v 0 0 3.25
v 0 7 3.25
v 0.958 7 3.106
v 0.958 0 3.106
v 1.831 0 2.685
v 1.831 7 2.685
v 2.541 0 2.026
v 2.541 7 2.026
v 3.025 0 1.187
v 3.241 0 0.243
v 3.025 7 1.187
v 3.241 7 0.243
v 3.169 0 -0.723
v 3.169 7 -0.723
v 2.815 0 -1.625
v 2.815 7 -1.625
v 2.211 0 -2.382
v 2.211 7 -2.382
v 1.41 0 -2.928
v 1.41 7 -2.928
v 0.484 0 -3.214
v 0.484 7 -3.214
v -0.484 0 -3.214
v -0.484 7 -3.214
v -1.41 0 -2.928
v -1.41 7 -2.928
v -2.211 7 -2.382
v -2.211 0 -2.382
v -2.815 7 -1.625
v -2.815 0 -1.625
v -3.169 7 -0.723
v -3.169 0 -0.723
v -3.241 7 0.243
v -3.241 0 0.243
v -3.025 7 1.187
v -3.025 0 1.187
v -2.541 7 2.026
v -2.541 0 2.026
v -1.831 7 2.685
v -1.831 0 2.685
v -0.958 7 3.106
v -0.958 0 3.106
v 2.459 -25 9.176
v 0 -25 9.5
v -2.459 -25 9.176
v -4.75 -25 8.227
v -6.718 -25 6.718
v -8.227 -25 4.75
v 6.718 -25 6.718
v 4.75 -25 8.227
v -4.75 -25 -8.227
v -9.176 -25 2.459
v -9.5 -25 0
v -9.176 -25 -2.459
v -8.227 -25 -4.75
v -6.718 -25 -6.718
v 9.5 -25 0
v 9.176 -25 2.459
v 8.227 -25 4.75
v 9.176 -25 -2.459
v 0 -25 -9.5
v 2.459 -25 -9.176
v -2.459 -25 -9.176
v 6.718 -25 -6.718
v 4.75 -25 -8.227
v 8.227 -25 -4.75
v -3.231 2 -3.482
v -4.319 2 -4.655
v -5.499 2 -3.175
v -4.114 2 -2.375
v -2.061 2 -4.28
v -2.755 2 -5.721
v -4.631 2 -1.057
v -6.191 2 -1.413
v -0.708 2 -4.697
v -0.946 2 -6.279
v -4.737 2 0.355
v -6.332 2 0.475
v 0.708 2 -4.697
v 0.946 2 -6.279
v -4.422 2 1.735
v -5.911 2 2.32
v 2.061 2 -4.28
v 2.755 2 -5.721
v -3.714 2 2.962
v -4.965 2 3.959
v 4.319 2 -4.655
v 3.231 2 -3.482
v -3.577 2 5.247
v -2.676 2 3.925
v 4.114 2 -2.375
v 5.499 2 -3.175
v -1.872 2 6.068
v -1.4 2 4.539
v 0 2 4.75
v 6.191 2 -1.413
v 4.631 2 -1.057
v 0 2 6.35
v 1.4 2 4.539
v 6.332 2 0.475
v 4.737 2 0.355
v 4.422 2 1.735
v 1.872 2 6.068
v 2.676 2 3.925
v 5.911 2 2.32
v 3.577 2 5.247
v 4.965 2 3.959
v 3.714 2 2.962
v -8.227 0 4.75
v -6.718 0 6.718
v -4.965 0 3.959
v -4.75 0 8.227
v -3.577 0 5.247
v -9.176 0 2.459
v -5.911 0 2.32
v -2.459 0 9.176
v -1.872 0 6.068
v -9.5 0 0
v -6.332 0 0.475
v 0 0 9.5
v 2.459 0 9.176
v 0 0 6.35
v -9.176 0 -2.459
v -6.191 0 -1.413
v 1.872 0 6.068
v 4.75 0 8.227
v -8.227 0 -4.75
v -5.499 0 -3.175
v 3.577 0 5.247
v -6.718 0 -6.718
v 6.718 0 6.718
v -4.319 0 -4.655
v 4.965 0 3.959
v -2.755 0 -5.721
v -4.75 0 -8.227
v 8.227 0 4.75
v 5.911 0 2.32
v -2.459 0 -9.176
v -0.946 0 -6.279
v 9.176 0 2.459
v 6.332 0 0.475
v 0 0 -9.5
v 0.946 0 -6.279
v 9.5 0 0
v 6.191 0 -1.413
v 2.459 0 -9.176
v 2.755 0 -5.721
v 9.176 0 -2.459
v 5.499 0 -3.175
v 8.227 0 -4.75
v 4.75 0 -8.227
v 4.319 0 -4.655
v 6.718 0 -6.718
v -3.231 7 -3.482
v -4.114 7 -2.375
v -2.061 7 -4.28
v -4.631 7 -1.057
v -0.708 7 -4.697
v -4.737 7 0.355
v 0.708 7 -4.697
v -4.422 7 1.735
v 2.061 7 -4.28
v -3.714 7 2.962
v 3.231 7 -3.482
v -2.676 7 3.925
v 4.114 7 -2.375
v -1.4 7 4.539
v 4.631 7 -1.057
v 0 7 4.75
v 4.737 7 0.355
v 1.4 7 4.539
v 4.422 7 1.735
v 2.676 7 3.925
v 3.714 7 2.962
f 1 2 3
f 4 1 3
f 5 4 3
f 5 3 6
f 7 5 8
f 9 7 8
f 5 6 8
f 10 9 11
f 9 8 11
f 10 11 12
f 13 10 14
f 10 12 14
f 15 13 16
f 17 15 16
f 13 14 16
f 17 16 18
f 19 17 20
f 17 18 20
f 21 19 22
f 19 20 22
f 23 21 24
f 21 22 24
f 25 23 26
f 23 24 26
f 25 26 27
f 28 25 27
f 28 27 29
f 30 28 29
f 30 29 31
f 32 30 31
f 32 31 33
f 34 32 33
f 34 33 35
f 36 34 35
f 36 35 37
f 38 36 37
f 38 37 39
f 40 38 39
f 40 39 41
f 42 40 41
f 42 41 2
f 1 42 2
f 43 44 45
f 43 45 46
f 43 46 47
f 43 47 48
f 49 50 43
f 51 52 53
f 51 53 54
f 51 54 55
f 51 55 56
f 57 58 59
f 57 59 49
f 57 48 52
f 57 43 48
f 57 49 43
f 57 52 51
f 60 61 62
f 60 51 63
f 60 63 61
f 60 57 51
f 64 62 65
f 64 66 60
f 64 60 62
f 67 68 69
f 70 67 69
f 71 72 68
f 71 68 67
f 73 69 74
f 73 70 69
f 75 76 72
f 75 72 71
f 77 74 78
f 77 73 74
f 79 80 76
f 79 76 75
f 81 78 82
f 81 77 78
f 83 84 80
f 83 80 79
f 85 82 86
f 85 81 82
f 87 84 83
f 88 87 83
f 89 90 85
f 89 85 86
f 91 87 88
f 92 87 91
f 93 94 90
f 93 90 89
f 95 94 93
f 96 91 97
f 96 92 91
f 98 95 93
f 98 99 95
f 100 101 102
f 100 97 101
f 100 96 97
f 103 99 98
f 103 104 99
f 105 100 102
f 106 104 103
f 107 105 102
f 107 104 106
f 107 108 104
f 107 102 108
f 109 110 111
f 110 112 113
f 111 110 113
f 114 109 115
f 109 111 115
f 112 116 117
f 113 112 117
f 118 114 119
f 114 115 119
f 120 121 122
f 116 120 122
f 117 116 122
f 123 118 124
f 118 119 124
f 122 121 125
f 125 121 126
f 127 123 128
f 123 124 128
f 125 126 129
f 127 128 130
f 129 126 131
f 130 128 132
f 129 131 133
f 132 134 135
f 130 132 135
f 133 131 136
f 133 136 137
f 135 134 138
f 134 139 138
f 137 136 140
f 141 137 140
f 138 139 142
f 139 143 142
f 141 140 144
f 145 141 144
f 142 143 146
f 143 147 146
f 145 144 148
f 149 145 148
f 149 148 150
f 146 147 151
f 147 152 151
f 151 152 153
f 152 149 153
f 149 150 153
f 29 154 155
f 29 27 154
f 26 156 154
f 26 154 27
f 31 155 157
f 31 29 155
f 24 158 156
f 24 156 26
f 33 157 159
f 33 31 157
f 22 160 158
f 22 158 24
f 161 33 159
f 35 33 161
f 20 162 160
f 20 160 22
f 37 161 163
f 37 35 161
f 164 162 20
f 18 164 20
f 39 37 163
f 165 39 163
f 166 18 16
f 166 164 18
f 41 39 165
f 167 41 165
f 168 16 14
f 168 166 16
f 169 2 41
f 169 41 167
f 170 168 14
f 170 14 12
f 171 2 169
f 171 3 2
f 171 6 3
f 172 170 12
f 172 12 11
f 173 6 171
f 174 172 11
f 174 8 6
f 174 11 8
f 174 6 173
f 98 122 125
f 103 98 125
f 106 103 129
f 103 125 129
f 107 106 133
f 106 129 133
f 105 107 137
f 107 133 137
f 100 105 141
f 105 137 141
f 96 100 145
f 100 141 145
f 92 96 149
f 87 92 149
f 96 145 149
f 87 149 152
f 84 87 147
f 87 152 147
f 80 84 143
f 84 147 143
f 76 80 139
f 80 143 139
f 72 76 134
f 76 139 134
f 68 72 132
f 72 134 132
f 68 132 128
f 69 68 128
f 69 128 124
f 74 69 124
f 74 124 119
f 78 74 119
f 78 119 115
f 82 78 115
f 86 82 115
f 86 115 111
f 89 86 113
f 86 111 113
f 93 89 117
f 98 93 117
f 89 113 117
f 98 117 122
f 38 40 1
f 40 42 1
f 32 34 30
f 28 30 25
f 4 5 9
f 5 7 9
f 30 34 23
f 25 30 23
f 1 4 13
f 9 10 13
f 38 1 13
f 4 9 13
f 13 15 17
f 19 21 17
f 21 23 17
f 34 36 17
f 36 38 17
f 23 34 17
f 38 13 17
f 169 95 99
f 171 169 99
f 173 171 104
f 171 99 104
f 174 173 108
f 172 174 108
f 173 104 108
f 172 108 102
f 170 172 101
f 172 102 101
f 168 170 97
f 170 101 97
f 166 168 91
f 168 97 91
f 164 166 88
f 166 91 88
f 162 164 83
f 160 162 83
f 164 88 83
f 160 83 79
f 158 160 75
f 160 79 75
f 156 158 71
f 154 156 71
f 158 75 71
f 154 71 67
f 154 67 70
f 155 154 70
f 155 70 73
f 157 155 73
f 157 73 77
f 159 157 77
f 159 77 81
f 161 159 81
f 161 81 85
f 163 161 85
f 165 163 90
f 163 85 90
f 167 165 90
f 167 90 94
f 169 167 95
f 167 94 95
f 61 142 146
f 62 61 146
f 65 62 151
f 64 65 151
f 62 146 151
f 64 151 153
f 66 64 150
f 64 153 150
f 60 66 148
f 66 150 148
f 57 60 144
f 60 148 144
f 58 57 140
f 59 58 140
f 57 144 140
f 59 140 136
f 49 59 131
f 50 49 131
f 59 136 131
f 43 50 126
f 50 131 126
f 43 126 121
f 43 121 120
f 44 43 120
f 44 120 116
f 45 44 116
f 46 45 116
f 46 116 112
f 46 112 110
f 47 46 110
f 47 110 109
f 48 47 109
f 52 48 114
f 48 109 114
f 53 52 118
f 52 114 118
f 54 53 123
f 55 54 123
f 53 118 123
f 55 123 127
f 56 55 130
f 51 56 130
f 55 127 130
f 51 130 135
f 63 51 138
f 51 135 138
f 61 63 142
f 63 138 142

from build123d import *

# Parameters (mm, degrees)
SKETCH_1_R          = 6.35
EXTRUDE_1_DEPTH     = 2
SKETCH_2_R          = 4.75
EXTRUDE_2_DEPTH     = 5
SKETCH_3_R          = 3.25
CUT_EXTRUDE_1_DEPTH = 12.386175829
SKETCH_4_R          = 9.5
EXTRUDE_3_DEPTH     = 25


with BuildPart() as part:
    # 草图1 → 凸台-拉伸1 (new body)
    with BuildSketch(Plane(origin=(0, 0, 0), x_dir=(1, 0, 0), z_dir=(0, 1, 0))):
        with Locations(Location((0, 0, 0), (0, 0, 270))):
            Circle(SKETCH_1_R)
    extrude(amount=EXTRUDE_1_DEPTH)

    # 草图2 → 凸台-拉伸2 (add)
    with BuildSketch(Plane(origin=(0, 2, 0), x_dir=(1, 0, 0), z_dir=(0, 1, 0))):
        with Locations(Location((0, 0, 0), (0, 0, 270))):
            Circle(SKETCH_2_R)
    extrude(amount=EXTRUDE_2_DEPTH)

    # 草图3 → 切除-拉伸1 (cut, through all)
    with BuildSketch(Plane(origin=(0, 7, 0), x_dir=(1, 0, 0), z_dir=(0, 1, 0))):
        with Locations(Location((0, 0, 0), (0, 0, 270))):
            Circle(SKETCH_3_R)
    extrude(amount=-CUT_EXTRUDE_1_DEPTH, mode=Mode.SUBTRACT)

    # 草图4 → 凸台-拉伸3 (add)
    with BuildSketch(Plane.XZ):
        with Locations(Location((0, 0, 0), (0, 0, 270))):
            Circle(SKETCH_4_R)
    extrude(amount=EXTRUDE_3_DEPTH)


solid = part.part
